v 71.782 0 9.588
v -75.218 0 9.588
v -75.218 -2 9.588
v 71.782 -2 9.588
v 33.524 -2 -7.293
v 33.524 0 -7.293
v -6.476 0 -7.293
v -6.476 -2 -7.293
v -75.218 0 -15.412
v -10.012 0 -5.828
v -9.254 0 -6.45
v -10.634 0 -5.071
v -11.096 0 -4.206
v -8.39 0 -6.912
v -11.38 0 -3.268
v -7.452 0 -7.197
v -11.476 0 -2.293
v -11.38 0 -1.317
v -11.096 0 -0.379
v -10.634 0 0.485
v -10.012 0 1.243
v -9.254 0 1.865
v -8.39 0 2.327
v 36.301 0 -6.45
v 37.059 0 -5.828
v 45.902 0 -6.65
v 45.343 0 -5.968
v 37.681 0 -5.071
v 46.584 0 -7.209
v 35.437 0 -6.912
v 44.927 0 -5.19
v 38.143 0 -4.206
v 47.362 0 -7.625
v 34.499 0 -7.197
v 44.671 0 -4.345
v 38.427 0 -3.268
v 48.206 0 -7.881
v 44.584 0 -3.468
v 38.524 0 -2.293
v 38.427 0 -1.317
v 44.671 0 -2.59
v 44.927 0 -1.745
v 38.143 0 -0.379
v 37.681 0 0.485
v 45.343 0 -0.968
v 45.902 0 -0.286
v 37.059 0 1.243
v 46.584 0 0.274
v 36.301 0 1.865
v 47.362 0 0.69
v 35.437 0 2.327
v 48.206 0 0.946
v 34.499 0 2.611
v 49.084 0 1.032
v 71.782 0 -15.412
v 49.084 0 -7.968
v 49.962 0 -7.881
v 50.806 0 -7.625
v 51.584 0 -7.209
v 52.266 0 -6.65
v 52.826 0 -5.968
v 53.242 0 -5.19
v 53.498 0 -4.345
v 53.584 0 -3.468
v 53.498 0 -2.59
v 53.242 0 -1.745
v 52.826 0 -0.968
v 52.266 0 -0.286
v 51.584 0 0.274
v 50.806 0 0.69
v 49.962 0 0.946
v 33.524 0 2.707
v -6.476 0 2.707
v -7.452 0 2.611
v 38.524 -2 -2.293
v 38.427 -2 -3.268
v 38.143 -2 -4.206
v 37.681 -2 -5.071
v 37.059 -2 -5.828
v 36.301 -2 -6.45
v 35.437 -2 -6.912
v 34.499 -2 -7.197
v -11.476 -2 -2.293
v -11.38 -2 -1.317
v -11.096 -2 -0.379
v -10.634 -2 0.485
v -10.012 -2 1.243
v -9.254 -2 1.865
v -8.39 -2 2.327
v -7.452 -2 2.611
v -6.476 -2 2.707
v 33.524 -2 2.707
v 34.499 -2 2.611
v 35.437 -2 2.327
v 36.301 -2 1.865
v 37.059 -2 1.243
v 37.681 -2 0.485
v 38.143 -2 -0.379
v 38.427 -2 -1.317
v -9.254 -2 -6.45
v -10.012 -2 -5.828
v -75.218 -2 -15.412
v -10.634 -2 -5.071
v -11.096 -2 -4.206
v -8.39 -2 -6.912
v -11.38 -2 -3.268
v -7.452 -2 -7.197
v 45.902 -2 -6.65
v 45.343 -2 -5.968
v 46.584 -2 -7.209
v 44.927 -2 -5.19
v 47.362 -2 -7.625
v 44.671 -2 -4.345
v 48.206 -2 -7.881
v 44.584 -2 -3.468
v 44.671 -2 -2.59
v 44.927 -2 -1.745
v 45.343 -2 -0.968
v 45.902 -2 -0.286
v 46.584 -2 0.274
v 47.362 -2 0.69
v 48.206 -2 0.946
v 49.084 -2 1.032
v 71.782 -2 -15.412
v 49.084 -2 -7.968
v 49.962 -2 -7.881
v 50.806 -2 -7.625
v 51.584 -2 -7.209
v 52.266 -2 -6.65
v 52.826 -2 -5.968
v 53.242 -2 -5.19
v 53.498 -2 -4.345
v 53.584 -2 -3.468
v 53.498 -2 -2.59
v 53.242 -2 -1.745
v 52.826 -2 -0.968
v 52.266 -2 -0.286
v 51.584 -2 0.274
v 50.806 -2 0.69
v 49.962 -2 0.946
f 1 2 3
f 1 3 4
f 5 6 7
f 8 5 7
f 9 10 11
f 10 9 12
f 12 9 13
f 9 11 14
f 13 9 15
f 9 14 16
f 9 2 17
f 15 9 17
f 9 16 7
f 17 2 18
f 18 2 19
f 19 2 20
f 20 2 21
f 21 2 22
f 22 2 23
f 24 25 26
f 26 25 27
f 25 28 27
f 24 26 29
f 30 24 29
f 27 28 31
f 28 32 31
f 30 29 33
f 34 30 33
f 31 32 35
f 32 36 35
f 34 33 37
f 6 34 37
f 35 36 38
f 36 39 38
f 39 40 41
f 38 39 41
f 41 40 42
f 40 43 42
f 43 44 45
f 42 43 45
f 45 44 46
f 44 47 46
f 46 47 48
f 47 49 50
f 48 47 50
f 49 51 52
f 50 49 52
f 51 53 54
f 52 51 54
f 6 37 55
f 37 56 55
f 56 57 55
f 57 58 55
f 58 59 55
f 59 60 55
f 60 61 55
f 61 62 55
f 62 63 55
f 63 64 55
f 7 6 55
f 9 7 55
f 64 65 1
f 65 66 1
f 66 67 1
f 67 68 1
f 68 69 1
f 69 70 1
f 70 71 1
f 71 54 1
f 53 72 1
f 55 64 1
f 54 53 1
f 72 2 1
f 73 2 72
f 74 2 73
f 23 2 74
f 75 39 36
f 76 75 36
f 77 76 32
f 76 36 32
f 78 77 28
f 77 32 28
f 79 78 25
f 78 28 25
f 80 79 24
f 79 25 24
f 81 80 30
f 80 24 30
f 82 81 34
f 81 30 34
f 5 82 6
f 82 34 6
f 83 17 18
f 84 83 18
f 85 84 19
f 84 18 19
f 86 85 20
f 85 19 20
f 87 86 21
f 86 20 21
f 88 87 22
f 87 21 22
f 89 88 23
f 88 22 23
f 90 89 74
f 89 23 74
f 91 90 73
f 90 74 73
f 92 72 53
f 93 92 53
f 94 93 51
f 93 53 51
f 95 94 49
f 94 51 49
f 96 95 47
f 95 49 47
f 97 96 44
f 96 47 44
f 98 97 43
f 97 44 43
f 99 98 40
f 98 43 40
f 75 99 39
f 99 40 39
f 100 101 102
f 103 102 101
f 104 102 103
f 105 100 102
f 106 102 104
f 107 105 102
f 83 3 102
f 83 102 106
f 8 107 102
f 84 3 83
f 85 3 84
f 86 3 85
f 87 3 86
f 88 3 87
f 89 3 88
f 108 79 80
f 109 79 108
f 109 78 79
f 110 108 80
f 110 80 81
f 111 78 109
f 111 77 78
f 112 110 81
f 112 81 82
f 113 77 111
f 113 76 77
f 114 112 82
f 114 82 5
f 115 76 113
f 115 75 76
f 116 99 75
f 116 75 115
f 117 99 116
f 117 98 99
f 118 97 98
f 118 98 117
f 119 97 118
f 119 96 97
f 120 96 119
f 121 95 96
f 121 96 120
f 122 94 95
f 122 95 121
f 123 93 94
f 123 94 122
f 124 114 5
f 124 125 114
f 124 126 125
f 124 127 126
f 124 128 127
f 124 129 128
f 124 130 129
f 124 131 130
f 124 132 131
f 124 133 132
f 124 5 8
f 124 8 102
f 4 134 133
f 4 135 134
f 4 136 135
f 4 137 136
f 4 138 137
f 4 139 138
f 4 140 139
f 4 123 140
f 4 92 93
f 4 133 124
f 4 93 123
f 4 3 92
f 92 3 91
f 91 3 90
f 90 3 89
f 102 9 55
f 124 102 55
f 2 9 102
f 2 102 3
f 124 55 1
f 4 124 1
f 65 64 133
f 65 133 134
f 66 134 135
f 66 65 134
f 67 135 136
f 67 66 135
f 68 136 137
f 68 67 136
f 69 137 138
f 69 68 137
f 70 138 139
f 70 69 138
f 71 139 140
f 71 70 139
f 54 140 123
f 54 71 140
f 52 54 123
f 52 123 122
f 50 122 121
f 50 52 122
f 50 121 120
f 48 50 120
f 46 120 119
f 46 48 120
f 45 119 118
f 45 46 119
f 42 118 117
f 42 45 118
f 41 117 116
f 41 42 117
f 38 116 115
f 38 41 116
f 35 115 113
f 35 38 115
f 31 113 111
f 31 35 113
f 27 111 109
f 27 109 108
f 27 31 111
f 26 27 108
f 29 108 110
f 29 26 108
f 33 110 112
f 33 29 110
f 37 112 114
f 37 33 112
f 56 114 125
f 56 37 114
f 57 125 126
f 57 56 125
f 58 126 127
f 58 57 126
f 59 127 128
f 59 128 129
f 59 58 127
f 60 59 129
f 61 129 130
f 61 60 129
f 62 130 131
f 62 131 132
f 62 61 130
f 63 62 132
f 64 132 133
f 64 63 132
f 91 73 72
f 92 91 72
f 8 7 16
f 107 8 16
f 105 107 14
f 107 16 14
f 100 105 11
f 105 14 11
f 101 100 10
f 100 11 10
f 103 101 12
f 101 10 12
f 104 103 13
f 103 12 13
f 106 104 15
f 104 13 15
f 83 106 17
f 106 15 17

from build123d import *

# Parameters (mm, degrees)
F0_W     = 147
F0_H     = 25
F0_R     = 4.5
F1_DEPTH = 2


with BuildPart() as f1:
    # F0 (on Front) → F1 (new body)
    with BuildSketch(Plane.XZ):
        with Locations((-1.7181, -2.911929)):
            Rectangle(F0_W, F0_H)
        with Locations((49.084206, -3.467572)):
            Circle(F0_R, mode=Mode.SUBTRACT)
        with BuildLine():
            ThreePointArc((-11.476482, -2.292731), (-10.012016, 1.242803), (-6.476482, 2.707269))
            Line((-6.476482, 2.707269), (33.523518, 2.707269))
            ThreePointArc((33.523518, 2.707269), (37.059052, 1.242803), (38.523518, -2.292731))
            ThreePointArc((38.523518, -2.292731), (37.059052, -5.828265), (33.523518, -7.292731))
            Line((33.523518, -7.292731), (-6.476482, -7.292731))
            ThreePointArc((-6.476482, -7.292731), (-10.012016, -5.828265), (-11.476482, -2.292731))
        make_face(mode=Mode.SUBTRACT)
    extrude(amount=F1_DEPTH)


solid = f1.part
